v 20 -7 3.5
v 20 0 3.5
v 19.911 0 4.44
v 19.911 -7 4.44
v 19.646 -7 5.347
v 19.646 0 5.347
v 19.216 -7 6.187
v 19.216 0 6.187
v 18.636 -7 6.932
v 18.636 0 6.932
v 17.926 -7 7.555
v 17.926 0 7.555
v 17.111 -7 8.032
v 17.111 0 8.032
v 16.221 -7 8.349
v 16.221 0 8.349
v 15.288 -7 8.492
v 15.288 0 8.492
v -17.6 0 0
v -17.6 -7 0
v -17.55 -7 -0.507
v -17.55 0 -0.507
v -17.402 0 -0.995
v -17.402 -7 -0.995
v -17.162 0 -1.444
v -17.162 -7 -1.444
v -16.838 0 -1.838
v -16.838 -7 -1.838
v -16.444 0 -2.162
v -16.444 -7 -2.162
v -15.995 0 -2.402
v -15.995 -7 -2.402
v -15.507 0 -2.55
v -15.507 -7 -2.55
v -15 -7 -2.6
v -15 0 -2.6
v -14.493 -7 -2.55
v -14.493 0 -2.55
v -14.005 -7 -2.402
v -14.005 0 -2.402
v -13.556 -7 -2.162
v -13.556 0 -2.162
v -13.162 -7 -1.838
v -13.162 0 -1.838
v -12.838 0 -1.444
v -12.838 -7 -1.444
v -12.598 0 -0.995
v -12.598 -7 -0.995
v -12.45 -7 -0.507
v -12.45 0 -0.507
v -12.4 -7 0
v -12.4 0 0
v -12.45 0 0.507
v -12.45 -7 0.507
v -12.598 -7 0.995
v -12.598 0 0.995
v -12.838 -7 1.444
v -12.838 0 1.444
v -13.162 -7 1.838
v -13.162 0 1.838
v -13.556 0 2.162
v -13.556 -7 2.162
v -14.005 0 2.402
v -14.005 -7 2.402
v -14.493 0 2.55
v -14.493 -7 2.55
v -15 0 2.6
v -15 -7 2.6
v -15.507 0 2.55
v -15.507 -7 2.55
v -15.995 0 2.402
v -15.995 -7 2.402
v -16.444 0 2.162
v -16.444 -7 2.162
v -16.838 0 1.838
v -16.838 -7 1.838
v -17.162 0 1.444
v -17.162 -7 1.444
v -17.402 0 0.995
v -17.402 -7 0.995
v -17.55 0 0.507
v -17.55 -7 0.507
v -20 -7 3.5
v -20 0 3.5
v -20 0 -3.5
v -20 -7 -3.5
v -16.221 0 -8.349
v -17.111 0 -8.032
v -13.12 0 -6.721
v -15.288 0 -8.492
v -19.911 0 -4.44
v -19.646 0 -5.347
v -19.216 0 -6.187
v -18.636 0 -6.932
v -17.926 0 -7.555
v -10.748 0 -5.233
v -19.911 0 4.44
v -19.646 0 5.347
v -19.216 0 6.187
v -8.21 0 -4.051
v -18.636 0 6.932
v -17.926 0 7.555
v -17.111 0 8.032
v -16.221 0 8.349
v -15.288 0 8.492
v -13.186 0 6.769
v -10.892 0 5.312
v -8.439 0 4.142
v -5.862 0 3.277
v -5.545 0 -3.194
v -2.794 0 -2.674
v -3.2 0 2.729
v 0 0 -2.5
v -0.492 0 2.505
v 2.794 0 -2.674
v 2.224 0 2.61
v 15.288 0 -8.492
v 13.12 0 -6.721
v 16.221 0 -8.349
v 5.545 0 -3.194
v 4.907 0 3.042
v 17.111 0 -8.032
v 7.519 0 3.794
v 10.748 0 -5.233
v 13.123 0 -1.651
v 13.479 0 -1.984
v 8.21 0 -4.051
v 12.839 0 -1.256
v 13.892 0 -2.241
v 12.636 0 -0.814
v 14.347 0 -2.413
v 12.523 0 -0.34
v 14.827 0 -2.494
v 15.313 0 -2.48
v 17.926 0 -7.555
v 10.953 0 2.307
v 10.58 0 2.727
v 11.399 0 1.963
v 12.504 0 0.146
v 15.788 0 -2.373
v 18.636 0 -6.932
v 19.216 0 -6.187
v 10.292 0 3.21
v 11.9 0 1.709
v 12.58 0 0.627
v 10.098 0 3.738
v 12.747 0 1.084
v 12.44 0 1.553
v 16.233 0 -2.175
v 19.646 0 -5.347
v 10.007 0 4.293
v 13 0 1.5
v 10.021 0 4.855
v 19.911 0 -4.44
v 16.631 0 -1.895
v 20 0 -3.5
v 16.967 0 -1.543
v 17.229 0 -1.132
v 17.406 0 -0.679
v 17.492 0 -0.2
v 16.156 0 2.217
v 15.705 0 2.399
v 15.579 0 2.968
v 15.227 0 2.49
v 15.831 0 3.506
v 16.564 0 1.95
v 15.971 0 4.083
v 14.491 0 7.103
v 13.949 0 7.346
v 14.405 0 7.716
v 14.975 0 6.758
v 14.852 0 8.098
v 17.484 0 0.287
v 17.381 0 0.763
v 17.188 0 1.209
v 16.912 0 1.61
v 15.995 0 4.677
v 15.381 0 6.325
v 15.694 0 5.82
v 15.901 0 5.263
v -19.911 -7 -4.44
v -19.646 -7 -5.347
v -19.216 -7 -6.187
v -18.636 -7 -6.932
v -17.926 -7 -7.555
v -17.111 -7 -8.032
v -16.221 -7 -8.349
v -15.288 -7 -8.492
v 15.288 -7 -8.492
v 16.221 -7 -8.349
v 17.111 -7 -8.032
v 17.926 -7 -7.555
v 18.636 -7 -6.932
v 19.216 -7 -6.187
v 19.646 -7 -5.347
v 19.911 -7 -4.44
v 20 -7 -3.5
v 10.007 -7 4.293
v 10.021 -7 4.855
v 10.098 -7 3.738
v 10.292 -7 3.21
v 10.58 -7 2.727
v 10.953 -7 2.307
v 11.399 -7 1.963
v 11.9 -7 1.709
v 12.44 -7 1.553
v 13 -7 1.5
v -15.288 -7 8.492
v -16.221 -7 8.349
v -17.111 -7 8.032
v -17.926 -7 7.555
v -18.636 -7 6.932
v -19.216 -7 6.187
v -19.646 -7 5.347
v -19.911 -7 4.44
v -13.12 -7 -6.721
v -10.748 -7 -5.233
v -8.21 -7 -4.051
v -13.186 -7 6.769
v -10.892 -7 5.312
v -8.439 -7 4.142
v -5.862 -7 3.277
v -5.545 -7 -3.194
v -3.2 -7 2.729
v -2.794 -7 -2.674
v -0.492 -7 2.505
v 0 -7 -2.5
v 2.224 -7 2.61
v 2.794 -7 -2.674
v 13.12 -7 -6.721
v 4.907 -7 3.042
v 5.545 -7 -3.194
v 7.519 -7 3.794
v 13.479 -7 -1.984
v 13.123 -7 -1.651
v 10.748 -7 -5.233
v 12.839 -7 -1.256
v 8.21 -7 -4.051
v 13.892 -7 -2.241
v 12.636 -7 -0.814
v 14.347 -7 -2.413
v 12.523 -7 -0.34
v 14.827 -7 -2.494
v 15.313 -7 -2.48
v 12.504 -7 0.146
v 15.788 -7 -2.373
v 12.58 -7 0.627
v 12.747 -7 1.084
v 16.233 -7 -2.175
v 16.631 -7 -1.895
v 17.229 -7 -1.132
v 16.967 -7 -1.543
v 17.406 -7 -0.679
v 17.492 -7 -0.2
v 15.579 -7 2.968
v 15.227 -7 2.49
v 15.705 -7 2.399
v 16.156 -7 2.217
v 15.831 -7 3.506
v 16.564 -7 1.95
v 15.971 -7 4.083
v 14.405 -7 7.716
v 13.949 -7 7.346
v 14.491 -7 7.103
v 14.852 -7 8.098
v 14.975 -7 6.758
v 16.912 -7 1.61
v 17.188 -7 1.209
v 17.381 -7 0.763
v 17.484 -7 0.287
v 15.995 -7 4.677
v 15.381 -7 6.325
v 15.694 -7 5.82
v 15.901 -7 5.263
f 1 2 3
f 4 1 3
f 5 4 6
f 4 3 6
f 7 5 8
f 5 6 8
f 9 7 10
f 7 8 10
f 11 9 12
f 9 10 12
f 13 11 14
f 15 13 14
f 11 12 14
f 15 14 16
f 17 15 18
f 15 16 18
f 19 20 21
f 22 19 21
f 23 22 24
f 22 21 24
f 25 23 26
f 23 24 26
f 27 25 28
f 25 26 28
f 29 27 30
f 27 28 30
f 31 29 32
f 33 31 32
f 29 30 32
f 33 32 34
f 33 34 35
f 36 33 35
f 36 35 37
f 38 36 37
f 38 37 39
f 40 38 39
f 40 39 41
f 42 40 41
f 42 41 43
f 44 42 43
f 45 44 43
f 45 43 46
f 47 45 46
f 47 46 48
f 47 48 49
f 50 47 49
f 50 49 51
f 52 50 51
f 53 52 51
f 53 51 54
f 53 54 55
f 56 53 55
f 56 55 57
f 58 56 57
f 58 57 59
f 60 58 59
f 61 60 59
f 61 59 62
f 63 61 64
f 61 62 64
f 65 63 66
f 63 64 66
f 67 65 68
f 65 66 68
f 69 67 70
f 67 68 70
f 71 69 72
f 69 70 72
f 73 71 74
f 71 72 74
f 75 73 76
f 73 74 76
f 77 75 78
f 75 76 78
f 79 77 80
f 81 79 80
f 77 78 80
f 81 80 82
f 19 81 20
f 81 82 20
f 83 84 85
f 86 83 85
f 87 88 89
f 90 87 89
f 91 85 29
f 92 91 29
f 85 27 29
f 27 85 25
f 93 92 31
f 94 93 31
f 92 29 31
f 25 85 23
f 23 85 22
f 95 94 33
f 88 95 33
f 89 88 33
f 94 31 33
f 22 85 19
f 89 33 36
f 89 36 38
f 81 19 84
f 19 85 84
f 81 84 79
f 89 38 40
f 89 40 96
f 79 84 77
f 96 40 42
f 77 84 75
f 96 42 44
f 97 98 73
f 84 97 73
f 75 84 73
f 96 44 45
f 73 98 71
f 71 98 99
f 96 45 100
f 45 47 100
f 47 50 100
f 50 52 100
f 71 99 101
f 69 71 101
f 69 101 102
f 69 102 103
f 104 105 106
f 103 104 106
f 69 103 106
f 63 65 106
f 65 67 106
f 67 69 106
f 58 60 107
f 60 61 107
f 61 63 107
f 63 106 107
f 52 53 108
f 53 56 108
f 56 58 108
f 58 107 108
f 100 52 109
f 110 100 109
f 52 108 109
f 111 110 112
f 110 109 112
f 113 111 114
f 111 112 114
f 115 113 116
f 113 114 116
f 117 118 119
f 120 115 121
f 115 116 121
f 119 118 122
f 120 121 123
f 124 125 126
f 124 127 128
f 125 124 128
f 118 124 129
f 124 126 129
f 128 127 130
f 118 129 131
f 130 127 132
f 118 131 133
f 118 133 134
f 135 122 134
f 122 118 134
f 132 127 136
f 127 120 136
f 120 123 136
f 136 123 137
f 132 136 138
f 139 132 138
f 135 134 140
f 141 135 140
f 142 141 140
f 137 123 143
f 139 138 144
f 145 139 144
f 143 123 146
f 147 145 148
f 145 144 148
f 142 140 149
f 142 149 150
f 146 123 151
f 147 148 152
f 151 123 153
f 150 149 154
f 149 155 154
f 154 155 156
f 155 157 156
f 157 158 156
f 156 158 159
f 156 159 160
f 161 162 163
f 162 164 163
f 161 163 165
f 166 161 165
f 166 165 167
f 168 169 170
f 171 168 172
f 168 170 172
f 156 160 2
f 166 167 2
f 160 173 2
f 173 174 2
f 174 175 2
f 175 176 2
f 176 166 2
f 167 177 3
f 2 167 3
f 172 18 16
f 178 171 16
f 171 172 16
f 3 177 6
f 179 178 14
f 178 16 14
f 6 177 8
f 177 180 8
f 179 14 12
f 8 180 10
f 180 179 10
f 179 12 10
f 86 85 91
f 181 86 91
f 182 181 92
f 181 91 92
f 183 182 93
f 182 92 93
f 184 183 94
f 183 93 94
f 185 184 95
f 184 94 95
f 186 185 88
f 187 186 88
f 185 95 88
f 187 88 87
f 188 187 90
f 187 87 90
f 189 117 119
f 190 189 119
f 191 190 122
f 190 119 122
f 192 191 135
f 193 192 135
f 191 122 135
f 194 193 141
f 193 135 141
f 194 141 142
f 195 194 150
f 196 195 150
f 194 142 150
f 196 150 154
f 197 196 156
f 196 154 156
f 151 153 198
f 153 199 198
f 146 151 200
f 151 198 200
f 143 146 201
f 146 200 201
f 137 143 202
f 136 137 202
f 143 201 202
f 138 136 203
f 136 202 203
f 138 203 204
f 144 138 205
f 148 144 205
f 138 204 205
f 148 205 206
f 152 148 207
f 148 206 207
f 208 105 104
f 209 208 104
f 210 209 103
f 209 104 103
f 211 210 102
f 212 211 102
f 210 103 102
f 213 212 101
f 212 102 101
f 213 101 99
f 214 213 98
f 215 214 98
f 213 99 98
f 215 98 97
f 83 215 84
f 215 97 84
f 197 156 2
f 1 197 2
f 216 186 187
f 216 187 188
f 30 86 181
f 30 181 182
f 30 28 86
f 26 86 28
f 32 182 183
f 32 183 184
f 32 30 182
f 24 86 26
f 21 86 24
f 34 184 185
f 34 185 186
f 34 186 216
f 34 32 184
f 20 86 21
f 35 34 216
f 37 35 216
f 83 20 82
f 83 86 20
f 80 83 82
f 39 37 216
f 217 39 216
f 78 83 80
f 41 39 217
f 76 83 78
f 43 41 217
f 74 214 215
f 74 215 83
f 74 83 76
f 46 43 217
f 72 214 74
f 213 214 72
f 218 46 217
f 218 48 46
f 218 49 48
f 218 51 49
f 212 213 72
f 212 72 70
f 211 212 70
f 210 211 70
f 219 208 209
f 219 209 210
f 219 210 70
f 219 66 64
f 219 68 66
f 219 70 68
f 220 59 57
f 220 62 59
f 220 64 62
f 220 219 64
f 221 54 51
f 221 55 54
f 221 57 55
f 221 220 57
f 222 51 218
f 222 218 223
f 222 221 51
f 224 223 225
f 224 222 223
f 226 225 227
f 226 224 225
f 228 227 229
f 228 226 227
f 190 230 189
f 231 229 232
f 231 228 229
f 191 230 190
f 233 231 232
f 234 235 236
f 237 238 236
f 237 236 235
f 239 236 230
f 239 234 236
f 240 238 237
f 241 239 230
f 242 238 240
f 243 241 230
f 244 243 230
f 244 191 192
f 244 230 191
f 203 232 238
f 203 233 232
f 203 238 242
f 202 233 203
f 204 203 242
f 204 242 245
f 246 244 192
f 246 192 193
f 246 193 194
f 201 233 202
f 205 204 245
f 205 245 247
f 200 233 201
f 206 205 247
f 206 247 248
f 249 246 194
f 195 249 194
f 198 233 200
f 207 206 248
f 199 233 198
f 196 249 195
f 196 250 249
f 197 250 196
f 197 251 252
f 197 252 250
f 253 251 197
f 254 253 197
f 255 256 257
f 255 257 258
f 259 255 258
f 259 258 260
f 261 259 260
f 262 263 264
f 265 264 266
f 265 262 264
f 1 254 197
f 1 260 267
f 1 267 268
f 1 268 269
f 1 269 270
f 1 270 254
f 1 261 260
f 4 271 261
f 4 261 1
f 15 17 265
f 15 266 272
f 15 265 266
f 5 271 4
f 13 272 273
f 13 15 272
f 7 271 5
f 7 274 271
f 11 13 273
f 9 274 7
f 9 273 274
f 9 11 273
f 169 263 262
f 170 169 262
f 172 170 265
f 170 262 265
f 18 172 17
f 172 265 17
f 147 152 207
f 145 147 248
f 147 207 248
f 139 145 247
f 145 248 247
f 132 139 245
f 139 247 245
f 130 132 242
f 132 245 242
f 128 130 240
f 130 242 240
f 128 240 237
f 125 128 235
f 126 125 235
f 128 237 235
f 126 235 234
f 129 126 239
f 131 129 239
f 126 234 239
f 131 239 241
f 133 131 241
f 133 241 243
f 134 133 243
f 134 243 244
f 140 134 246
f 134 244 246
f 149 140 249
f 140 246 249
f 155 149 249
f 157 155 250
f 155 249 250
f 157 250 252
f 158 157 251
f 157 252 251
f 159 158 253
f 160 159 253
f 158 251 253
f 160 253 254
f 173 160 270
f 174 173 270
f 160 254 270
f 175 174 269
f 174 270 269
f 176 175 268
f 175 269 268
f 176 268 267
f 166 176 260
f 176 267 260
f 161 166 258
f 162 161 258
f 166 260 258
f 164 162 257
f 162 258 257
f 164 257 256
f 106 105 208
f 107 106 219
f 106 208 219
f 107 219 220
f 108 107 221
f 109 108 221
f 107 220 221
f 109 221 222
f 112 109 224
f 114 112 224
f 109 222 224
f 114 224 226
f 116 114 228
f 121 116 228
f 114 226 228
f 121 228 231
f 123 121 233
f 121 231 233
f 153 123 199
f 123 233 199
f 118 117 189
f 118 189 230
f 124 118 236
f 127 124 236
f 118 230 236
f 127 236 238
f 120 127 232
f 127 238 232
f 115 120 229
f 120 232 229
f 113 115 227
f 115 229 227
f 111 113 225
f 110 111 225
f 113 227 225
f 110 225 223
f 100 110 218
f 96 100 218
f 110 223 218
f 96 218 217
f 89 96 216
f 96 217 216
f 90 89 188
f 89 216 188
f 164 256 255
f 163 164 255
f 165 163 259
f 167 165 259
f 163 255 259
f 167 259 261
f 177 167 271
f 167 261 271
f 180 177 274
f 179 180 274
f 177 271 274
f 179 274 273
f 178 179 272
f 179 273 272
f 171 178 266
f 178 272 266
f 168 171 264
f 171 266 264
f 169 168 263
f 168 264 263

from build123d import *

# Parameters (mm, degrees)
F1_DEPTH = 7
F3_D     = 5.2
F5_D     = 5
F7_D     = 45
F9_D     = 45
F11_D    = 6


with BuildPart() as f1:
    # F0 (on Front) → F1 (new body)
    with BuildSketch(Plane.XZ):
        with BuildLine():
            Line((-15, -8.5), (15, -8.5))
            ThreePointArc((15, -8.5), (18.5355339059, -7.0355339059), (20, -3.5))
            Line((20, -3.5), (20, 3.5))
            ThreePointArc((20, 3.5), (18.5355339059, 7.0355339059), (15, 8.5))
            Line((15, 8.5), (-15, 8.5))
            ThreePointArc((-15, 8.5), (-18.5355339059, 7.0355339059), (-20, 3.5))
            Line((-20, 3.5), (-20, -3.5))
            ThreePointArc((-20, -3.5), (-18.5355339059, -7.0355339059), (-15, -8.5))
        make_face()
    extrude(amount=F1_DEPTH)

    # F3 (through all)
    with Locations(Plane(origin=(0, 0, 0), x_dir=(1, 0, 0), z_dir=(0, 1, 0))):
        with Locations((-15, 0)):
            Hole(F3_D / 2)

    # F5 (through all)
    with Locations(Plane(origin=(0, 0, 0), x_dir=(1, 0, 0), z_dir=(0, 1, 0))):
        with Locations((15, 0)):
            Hole(F5_D / 2)

    # F7 (through all)
    with Locations(Plane(origin=(0, 0, 0), x_dir=(1, 0, 0), z_dir=(0, 1, 0))):
        with Locations((0, 25)):
            Hole(F7_D / 2)

    # F9 (through all)
    with Locations(Plane(origin=(0, 0, 0), x_dir=(1, 0, 0), z_dir=(0, 1, 0))):
        with Locations((0, -25)):
            Hole(F9_D / 2)

    # F11 (through all)
    with Locations(Plane(origin=(0, 0, 0), x_dir=(1, 0, 0), z_dir=(0, 1, 0))):
        with Locations((13, -4.5)):
            Hole(F11_D / 2)


solid = f1.part
